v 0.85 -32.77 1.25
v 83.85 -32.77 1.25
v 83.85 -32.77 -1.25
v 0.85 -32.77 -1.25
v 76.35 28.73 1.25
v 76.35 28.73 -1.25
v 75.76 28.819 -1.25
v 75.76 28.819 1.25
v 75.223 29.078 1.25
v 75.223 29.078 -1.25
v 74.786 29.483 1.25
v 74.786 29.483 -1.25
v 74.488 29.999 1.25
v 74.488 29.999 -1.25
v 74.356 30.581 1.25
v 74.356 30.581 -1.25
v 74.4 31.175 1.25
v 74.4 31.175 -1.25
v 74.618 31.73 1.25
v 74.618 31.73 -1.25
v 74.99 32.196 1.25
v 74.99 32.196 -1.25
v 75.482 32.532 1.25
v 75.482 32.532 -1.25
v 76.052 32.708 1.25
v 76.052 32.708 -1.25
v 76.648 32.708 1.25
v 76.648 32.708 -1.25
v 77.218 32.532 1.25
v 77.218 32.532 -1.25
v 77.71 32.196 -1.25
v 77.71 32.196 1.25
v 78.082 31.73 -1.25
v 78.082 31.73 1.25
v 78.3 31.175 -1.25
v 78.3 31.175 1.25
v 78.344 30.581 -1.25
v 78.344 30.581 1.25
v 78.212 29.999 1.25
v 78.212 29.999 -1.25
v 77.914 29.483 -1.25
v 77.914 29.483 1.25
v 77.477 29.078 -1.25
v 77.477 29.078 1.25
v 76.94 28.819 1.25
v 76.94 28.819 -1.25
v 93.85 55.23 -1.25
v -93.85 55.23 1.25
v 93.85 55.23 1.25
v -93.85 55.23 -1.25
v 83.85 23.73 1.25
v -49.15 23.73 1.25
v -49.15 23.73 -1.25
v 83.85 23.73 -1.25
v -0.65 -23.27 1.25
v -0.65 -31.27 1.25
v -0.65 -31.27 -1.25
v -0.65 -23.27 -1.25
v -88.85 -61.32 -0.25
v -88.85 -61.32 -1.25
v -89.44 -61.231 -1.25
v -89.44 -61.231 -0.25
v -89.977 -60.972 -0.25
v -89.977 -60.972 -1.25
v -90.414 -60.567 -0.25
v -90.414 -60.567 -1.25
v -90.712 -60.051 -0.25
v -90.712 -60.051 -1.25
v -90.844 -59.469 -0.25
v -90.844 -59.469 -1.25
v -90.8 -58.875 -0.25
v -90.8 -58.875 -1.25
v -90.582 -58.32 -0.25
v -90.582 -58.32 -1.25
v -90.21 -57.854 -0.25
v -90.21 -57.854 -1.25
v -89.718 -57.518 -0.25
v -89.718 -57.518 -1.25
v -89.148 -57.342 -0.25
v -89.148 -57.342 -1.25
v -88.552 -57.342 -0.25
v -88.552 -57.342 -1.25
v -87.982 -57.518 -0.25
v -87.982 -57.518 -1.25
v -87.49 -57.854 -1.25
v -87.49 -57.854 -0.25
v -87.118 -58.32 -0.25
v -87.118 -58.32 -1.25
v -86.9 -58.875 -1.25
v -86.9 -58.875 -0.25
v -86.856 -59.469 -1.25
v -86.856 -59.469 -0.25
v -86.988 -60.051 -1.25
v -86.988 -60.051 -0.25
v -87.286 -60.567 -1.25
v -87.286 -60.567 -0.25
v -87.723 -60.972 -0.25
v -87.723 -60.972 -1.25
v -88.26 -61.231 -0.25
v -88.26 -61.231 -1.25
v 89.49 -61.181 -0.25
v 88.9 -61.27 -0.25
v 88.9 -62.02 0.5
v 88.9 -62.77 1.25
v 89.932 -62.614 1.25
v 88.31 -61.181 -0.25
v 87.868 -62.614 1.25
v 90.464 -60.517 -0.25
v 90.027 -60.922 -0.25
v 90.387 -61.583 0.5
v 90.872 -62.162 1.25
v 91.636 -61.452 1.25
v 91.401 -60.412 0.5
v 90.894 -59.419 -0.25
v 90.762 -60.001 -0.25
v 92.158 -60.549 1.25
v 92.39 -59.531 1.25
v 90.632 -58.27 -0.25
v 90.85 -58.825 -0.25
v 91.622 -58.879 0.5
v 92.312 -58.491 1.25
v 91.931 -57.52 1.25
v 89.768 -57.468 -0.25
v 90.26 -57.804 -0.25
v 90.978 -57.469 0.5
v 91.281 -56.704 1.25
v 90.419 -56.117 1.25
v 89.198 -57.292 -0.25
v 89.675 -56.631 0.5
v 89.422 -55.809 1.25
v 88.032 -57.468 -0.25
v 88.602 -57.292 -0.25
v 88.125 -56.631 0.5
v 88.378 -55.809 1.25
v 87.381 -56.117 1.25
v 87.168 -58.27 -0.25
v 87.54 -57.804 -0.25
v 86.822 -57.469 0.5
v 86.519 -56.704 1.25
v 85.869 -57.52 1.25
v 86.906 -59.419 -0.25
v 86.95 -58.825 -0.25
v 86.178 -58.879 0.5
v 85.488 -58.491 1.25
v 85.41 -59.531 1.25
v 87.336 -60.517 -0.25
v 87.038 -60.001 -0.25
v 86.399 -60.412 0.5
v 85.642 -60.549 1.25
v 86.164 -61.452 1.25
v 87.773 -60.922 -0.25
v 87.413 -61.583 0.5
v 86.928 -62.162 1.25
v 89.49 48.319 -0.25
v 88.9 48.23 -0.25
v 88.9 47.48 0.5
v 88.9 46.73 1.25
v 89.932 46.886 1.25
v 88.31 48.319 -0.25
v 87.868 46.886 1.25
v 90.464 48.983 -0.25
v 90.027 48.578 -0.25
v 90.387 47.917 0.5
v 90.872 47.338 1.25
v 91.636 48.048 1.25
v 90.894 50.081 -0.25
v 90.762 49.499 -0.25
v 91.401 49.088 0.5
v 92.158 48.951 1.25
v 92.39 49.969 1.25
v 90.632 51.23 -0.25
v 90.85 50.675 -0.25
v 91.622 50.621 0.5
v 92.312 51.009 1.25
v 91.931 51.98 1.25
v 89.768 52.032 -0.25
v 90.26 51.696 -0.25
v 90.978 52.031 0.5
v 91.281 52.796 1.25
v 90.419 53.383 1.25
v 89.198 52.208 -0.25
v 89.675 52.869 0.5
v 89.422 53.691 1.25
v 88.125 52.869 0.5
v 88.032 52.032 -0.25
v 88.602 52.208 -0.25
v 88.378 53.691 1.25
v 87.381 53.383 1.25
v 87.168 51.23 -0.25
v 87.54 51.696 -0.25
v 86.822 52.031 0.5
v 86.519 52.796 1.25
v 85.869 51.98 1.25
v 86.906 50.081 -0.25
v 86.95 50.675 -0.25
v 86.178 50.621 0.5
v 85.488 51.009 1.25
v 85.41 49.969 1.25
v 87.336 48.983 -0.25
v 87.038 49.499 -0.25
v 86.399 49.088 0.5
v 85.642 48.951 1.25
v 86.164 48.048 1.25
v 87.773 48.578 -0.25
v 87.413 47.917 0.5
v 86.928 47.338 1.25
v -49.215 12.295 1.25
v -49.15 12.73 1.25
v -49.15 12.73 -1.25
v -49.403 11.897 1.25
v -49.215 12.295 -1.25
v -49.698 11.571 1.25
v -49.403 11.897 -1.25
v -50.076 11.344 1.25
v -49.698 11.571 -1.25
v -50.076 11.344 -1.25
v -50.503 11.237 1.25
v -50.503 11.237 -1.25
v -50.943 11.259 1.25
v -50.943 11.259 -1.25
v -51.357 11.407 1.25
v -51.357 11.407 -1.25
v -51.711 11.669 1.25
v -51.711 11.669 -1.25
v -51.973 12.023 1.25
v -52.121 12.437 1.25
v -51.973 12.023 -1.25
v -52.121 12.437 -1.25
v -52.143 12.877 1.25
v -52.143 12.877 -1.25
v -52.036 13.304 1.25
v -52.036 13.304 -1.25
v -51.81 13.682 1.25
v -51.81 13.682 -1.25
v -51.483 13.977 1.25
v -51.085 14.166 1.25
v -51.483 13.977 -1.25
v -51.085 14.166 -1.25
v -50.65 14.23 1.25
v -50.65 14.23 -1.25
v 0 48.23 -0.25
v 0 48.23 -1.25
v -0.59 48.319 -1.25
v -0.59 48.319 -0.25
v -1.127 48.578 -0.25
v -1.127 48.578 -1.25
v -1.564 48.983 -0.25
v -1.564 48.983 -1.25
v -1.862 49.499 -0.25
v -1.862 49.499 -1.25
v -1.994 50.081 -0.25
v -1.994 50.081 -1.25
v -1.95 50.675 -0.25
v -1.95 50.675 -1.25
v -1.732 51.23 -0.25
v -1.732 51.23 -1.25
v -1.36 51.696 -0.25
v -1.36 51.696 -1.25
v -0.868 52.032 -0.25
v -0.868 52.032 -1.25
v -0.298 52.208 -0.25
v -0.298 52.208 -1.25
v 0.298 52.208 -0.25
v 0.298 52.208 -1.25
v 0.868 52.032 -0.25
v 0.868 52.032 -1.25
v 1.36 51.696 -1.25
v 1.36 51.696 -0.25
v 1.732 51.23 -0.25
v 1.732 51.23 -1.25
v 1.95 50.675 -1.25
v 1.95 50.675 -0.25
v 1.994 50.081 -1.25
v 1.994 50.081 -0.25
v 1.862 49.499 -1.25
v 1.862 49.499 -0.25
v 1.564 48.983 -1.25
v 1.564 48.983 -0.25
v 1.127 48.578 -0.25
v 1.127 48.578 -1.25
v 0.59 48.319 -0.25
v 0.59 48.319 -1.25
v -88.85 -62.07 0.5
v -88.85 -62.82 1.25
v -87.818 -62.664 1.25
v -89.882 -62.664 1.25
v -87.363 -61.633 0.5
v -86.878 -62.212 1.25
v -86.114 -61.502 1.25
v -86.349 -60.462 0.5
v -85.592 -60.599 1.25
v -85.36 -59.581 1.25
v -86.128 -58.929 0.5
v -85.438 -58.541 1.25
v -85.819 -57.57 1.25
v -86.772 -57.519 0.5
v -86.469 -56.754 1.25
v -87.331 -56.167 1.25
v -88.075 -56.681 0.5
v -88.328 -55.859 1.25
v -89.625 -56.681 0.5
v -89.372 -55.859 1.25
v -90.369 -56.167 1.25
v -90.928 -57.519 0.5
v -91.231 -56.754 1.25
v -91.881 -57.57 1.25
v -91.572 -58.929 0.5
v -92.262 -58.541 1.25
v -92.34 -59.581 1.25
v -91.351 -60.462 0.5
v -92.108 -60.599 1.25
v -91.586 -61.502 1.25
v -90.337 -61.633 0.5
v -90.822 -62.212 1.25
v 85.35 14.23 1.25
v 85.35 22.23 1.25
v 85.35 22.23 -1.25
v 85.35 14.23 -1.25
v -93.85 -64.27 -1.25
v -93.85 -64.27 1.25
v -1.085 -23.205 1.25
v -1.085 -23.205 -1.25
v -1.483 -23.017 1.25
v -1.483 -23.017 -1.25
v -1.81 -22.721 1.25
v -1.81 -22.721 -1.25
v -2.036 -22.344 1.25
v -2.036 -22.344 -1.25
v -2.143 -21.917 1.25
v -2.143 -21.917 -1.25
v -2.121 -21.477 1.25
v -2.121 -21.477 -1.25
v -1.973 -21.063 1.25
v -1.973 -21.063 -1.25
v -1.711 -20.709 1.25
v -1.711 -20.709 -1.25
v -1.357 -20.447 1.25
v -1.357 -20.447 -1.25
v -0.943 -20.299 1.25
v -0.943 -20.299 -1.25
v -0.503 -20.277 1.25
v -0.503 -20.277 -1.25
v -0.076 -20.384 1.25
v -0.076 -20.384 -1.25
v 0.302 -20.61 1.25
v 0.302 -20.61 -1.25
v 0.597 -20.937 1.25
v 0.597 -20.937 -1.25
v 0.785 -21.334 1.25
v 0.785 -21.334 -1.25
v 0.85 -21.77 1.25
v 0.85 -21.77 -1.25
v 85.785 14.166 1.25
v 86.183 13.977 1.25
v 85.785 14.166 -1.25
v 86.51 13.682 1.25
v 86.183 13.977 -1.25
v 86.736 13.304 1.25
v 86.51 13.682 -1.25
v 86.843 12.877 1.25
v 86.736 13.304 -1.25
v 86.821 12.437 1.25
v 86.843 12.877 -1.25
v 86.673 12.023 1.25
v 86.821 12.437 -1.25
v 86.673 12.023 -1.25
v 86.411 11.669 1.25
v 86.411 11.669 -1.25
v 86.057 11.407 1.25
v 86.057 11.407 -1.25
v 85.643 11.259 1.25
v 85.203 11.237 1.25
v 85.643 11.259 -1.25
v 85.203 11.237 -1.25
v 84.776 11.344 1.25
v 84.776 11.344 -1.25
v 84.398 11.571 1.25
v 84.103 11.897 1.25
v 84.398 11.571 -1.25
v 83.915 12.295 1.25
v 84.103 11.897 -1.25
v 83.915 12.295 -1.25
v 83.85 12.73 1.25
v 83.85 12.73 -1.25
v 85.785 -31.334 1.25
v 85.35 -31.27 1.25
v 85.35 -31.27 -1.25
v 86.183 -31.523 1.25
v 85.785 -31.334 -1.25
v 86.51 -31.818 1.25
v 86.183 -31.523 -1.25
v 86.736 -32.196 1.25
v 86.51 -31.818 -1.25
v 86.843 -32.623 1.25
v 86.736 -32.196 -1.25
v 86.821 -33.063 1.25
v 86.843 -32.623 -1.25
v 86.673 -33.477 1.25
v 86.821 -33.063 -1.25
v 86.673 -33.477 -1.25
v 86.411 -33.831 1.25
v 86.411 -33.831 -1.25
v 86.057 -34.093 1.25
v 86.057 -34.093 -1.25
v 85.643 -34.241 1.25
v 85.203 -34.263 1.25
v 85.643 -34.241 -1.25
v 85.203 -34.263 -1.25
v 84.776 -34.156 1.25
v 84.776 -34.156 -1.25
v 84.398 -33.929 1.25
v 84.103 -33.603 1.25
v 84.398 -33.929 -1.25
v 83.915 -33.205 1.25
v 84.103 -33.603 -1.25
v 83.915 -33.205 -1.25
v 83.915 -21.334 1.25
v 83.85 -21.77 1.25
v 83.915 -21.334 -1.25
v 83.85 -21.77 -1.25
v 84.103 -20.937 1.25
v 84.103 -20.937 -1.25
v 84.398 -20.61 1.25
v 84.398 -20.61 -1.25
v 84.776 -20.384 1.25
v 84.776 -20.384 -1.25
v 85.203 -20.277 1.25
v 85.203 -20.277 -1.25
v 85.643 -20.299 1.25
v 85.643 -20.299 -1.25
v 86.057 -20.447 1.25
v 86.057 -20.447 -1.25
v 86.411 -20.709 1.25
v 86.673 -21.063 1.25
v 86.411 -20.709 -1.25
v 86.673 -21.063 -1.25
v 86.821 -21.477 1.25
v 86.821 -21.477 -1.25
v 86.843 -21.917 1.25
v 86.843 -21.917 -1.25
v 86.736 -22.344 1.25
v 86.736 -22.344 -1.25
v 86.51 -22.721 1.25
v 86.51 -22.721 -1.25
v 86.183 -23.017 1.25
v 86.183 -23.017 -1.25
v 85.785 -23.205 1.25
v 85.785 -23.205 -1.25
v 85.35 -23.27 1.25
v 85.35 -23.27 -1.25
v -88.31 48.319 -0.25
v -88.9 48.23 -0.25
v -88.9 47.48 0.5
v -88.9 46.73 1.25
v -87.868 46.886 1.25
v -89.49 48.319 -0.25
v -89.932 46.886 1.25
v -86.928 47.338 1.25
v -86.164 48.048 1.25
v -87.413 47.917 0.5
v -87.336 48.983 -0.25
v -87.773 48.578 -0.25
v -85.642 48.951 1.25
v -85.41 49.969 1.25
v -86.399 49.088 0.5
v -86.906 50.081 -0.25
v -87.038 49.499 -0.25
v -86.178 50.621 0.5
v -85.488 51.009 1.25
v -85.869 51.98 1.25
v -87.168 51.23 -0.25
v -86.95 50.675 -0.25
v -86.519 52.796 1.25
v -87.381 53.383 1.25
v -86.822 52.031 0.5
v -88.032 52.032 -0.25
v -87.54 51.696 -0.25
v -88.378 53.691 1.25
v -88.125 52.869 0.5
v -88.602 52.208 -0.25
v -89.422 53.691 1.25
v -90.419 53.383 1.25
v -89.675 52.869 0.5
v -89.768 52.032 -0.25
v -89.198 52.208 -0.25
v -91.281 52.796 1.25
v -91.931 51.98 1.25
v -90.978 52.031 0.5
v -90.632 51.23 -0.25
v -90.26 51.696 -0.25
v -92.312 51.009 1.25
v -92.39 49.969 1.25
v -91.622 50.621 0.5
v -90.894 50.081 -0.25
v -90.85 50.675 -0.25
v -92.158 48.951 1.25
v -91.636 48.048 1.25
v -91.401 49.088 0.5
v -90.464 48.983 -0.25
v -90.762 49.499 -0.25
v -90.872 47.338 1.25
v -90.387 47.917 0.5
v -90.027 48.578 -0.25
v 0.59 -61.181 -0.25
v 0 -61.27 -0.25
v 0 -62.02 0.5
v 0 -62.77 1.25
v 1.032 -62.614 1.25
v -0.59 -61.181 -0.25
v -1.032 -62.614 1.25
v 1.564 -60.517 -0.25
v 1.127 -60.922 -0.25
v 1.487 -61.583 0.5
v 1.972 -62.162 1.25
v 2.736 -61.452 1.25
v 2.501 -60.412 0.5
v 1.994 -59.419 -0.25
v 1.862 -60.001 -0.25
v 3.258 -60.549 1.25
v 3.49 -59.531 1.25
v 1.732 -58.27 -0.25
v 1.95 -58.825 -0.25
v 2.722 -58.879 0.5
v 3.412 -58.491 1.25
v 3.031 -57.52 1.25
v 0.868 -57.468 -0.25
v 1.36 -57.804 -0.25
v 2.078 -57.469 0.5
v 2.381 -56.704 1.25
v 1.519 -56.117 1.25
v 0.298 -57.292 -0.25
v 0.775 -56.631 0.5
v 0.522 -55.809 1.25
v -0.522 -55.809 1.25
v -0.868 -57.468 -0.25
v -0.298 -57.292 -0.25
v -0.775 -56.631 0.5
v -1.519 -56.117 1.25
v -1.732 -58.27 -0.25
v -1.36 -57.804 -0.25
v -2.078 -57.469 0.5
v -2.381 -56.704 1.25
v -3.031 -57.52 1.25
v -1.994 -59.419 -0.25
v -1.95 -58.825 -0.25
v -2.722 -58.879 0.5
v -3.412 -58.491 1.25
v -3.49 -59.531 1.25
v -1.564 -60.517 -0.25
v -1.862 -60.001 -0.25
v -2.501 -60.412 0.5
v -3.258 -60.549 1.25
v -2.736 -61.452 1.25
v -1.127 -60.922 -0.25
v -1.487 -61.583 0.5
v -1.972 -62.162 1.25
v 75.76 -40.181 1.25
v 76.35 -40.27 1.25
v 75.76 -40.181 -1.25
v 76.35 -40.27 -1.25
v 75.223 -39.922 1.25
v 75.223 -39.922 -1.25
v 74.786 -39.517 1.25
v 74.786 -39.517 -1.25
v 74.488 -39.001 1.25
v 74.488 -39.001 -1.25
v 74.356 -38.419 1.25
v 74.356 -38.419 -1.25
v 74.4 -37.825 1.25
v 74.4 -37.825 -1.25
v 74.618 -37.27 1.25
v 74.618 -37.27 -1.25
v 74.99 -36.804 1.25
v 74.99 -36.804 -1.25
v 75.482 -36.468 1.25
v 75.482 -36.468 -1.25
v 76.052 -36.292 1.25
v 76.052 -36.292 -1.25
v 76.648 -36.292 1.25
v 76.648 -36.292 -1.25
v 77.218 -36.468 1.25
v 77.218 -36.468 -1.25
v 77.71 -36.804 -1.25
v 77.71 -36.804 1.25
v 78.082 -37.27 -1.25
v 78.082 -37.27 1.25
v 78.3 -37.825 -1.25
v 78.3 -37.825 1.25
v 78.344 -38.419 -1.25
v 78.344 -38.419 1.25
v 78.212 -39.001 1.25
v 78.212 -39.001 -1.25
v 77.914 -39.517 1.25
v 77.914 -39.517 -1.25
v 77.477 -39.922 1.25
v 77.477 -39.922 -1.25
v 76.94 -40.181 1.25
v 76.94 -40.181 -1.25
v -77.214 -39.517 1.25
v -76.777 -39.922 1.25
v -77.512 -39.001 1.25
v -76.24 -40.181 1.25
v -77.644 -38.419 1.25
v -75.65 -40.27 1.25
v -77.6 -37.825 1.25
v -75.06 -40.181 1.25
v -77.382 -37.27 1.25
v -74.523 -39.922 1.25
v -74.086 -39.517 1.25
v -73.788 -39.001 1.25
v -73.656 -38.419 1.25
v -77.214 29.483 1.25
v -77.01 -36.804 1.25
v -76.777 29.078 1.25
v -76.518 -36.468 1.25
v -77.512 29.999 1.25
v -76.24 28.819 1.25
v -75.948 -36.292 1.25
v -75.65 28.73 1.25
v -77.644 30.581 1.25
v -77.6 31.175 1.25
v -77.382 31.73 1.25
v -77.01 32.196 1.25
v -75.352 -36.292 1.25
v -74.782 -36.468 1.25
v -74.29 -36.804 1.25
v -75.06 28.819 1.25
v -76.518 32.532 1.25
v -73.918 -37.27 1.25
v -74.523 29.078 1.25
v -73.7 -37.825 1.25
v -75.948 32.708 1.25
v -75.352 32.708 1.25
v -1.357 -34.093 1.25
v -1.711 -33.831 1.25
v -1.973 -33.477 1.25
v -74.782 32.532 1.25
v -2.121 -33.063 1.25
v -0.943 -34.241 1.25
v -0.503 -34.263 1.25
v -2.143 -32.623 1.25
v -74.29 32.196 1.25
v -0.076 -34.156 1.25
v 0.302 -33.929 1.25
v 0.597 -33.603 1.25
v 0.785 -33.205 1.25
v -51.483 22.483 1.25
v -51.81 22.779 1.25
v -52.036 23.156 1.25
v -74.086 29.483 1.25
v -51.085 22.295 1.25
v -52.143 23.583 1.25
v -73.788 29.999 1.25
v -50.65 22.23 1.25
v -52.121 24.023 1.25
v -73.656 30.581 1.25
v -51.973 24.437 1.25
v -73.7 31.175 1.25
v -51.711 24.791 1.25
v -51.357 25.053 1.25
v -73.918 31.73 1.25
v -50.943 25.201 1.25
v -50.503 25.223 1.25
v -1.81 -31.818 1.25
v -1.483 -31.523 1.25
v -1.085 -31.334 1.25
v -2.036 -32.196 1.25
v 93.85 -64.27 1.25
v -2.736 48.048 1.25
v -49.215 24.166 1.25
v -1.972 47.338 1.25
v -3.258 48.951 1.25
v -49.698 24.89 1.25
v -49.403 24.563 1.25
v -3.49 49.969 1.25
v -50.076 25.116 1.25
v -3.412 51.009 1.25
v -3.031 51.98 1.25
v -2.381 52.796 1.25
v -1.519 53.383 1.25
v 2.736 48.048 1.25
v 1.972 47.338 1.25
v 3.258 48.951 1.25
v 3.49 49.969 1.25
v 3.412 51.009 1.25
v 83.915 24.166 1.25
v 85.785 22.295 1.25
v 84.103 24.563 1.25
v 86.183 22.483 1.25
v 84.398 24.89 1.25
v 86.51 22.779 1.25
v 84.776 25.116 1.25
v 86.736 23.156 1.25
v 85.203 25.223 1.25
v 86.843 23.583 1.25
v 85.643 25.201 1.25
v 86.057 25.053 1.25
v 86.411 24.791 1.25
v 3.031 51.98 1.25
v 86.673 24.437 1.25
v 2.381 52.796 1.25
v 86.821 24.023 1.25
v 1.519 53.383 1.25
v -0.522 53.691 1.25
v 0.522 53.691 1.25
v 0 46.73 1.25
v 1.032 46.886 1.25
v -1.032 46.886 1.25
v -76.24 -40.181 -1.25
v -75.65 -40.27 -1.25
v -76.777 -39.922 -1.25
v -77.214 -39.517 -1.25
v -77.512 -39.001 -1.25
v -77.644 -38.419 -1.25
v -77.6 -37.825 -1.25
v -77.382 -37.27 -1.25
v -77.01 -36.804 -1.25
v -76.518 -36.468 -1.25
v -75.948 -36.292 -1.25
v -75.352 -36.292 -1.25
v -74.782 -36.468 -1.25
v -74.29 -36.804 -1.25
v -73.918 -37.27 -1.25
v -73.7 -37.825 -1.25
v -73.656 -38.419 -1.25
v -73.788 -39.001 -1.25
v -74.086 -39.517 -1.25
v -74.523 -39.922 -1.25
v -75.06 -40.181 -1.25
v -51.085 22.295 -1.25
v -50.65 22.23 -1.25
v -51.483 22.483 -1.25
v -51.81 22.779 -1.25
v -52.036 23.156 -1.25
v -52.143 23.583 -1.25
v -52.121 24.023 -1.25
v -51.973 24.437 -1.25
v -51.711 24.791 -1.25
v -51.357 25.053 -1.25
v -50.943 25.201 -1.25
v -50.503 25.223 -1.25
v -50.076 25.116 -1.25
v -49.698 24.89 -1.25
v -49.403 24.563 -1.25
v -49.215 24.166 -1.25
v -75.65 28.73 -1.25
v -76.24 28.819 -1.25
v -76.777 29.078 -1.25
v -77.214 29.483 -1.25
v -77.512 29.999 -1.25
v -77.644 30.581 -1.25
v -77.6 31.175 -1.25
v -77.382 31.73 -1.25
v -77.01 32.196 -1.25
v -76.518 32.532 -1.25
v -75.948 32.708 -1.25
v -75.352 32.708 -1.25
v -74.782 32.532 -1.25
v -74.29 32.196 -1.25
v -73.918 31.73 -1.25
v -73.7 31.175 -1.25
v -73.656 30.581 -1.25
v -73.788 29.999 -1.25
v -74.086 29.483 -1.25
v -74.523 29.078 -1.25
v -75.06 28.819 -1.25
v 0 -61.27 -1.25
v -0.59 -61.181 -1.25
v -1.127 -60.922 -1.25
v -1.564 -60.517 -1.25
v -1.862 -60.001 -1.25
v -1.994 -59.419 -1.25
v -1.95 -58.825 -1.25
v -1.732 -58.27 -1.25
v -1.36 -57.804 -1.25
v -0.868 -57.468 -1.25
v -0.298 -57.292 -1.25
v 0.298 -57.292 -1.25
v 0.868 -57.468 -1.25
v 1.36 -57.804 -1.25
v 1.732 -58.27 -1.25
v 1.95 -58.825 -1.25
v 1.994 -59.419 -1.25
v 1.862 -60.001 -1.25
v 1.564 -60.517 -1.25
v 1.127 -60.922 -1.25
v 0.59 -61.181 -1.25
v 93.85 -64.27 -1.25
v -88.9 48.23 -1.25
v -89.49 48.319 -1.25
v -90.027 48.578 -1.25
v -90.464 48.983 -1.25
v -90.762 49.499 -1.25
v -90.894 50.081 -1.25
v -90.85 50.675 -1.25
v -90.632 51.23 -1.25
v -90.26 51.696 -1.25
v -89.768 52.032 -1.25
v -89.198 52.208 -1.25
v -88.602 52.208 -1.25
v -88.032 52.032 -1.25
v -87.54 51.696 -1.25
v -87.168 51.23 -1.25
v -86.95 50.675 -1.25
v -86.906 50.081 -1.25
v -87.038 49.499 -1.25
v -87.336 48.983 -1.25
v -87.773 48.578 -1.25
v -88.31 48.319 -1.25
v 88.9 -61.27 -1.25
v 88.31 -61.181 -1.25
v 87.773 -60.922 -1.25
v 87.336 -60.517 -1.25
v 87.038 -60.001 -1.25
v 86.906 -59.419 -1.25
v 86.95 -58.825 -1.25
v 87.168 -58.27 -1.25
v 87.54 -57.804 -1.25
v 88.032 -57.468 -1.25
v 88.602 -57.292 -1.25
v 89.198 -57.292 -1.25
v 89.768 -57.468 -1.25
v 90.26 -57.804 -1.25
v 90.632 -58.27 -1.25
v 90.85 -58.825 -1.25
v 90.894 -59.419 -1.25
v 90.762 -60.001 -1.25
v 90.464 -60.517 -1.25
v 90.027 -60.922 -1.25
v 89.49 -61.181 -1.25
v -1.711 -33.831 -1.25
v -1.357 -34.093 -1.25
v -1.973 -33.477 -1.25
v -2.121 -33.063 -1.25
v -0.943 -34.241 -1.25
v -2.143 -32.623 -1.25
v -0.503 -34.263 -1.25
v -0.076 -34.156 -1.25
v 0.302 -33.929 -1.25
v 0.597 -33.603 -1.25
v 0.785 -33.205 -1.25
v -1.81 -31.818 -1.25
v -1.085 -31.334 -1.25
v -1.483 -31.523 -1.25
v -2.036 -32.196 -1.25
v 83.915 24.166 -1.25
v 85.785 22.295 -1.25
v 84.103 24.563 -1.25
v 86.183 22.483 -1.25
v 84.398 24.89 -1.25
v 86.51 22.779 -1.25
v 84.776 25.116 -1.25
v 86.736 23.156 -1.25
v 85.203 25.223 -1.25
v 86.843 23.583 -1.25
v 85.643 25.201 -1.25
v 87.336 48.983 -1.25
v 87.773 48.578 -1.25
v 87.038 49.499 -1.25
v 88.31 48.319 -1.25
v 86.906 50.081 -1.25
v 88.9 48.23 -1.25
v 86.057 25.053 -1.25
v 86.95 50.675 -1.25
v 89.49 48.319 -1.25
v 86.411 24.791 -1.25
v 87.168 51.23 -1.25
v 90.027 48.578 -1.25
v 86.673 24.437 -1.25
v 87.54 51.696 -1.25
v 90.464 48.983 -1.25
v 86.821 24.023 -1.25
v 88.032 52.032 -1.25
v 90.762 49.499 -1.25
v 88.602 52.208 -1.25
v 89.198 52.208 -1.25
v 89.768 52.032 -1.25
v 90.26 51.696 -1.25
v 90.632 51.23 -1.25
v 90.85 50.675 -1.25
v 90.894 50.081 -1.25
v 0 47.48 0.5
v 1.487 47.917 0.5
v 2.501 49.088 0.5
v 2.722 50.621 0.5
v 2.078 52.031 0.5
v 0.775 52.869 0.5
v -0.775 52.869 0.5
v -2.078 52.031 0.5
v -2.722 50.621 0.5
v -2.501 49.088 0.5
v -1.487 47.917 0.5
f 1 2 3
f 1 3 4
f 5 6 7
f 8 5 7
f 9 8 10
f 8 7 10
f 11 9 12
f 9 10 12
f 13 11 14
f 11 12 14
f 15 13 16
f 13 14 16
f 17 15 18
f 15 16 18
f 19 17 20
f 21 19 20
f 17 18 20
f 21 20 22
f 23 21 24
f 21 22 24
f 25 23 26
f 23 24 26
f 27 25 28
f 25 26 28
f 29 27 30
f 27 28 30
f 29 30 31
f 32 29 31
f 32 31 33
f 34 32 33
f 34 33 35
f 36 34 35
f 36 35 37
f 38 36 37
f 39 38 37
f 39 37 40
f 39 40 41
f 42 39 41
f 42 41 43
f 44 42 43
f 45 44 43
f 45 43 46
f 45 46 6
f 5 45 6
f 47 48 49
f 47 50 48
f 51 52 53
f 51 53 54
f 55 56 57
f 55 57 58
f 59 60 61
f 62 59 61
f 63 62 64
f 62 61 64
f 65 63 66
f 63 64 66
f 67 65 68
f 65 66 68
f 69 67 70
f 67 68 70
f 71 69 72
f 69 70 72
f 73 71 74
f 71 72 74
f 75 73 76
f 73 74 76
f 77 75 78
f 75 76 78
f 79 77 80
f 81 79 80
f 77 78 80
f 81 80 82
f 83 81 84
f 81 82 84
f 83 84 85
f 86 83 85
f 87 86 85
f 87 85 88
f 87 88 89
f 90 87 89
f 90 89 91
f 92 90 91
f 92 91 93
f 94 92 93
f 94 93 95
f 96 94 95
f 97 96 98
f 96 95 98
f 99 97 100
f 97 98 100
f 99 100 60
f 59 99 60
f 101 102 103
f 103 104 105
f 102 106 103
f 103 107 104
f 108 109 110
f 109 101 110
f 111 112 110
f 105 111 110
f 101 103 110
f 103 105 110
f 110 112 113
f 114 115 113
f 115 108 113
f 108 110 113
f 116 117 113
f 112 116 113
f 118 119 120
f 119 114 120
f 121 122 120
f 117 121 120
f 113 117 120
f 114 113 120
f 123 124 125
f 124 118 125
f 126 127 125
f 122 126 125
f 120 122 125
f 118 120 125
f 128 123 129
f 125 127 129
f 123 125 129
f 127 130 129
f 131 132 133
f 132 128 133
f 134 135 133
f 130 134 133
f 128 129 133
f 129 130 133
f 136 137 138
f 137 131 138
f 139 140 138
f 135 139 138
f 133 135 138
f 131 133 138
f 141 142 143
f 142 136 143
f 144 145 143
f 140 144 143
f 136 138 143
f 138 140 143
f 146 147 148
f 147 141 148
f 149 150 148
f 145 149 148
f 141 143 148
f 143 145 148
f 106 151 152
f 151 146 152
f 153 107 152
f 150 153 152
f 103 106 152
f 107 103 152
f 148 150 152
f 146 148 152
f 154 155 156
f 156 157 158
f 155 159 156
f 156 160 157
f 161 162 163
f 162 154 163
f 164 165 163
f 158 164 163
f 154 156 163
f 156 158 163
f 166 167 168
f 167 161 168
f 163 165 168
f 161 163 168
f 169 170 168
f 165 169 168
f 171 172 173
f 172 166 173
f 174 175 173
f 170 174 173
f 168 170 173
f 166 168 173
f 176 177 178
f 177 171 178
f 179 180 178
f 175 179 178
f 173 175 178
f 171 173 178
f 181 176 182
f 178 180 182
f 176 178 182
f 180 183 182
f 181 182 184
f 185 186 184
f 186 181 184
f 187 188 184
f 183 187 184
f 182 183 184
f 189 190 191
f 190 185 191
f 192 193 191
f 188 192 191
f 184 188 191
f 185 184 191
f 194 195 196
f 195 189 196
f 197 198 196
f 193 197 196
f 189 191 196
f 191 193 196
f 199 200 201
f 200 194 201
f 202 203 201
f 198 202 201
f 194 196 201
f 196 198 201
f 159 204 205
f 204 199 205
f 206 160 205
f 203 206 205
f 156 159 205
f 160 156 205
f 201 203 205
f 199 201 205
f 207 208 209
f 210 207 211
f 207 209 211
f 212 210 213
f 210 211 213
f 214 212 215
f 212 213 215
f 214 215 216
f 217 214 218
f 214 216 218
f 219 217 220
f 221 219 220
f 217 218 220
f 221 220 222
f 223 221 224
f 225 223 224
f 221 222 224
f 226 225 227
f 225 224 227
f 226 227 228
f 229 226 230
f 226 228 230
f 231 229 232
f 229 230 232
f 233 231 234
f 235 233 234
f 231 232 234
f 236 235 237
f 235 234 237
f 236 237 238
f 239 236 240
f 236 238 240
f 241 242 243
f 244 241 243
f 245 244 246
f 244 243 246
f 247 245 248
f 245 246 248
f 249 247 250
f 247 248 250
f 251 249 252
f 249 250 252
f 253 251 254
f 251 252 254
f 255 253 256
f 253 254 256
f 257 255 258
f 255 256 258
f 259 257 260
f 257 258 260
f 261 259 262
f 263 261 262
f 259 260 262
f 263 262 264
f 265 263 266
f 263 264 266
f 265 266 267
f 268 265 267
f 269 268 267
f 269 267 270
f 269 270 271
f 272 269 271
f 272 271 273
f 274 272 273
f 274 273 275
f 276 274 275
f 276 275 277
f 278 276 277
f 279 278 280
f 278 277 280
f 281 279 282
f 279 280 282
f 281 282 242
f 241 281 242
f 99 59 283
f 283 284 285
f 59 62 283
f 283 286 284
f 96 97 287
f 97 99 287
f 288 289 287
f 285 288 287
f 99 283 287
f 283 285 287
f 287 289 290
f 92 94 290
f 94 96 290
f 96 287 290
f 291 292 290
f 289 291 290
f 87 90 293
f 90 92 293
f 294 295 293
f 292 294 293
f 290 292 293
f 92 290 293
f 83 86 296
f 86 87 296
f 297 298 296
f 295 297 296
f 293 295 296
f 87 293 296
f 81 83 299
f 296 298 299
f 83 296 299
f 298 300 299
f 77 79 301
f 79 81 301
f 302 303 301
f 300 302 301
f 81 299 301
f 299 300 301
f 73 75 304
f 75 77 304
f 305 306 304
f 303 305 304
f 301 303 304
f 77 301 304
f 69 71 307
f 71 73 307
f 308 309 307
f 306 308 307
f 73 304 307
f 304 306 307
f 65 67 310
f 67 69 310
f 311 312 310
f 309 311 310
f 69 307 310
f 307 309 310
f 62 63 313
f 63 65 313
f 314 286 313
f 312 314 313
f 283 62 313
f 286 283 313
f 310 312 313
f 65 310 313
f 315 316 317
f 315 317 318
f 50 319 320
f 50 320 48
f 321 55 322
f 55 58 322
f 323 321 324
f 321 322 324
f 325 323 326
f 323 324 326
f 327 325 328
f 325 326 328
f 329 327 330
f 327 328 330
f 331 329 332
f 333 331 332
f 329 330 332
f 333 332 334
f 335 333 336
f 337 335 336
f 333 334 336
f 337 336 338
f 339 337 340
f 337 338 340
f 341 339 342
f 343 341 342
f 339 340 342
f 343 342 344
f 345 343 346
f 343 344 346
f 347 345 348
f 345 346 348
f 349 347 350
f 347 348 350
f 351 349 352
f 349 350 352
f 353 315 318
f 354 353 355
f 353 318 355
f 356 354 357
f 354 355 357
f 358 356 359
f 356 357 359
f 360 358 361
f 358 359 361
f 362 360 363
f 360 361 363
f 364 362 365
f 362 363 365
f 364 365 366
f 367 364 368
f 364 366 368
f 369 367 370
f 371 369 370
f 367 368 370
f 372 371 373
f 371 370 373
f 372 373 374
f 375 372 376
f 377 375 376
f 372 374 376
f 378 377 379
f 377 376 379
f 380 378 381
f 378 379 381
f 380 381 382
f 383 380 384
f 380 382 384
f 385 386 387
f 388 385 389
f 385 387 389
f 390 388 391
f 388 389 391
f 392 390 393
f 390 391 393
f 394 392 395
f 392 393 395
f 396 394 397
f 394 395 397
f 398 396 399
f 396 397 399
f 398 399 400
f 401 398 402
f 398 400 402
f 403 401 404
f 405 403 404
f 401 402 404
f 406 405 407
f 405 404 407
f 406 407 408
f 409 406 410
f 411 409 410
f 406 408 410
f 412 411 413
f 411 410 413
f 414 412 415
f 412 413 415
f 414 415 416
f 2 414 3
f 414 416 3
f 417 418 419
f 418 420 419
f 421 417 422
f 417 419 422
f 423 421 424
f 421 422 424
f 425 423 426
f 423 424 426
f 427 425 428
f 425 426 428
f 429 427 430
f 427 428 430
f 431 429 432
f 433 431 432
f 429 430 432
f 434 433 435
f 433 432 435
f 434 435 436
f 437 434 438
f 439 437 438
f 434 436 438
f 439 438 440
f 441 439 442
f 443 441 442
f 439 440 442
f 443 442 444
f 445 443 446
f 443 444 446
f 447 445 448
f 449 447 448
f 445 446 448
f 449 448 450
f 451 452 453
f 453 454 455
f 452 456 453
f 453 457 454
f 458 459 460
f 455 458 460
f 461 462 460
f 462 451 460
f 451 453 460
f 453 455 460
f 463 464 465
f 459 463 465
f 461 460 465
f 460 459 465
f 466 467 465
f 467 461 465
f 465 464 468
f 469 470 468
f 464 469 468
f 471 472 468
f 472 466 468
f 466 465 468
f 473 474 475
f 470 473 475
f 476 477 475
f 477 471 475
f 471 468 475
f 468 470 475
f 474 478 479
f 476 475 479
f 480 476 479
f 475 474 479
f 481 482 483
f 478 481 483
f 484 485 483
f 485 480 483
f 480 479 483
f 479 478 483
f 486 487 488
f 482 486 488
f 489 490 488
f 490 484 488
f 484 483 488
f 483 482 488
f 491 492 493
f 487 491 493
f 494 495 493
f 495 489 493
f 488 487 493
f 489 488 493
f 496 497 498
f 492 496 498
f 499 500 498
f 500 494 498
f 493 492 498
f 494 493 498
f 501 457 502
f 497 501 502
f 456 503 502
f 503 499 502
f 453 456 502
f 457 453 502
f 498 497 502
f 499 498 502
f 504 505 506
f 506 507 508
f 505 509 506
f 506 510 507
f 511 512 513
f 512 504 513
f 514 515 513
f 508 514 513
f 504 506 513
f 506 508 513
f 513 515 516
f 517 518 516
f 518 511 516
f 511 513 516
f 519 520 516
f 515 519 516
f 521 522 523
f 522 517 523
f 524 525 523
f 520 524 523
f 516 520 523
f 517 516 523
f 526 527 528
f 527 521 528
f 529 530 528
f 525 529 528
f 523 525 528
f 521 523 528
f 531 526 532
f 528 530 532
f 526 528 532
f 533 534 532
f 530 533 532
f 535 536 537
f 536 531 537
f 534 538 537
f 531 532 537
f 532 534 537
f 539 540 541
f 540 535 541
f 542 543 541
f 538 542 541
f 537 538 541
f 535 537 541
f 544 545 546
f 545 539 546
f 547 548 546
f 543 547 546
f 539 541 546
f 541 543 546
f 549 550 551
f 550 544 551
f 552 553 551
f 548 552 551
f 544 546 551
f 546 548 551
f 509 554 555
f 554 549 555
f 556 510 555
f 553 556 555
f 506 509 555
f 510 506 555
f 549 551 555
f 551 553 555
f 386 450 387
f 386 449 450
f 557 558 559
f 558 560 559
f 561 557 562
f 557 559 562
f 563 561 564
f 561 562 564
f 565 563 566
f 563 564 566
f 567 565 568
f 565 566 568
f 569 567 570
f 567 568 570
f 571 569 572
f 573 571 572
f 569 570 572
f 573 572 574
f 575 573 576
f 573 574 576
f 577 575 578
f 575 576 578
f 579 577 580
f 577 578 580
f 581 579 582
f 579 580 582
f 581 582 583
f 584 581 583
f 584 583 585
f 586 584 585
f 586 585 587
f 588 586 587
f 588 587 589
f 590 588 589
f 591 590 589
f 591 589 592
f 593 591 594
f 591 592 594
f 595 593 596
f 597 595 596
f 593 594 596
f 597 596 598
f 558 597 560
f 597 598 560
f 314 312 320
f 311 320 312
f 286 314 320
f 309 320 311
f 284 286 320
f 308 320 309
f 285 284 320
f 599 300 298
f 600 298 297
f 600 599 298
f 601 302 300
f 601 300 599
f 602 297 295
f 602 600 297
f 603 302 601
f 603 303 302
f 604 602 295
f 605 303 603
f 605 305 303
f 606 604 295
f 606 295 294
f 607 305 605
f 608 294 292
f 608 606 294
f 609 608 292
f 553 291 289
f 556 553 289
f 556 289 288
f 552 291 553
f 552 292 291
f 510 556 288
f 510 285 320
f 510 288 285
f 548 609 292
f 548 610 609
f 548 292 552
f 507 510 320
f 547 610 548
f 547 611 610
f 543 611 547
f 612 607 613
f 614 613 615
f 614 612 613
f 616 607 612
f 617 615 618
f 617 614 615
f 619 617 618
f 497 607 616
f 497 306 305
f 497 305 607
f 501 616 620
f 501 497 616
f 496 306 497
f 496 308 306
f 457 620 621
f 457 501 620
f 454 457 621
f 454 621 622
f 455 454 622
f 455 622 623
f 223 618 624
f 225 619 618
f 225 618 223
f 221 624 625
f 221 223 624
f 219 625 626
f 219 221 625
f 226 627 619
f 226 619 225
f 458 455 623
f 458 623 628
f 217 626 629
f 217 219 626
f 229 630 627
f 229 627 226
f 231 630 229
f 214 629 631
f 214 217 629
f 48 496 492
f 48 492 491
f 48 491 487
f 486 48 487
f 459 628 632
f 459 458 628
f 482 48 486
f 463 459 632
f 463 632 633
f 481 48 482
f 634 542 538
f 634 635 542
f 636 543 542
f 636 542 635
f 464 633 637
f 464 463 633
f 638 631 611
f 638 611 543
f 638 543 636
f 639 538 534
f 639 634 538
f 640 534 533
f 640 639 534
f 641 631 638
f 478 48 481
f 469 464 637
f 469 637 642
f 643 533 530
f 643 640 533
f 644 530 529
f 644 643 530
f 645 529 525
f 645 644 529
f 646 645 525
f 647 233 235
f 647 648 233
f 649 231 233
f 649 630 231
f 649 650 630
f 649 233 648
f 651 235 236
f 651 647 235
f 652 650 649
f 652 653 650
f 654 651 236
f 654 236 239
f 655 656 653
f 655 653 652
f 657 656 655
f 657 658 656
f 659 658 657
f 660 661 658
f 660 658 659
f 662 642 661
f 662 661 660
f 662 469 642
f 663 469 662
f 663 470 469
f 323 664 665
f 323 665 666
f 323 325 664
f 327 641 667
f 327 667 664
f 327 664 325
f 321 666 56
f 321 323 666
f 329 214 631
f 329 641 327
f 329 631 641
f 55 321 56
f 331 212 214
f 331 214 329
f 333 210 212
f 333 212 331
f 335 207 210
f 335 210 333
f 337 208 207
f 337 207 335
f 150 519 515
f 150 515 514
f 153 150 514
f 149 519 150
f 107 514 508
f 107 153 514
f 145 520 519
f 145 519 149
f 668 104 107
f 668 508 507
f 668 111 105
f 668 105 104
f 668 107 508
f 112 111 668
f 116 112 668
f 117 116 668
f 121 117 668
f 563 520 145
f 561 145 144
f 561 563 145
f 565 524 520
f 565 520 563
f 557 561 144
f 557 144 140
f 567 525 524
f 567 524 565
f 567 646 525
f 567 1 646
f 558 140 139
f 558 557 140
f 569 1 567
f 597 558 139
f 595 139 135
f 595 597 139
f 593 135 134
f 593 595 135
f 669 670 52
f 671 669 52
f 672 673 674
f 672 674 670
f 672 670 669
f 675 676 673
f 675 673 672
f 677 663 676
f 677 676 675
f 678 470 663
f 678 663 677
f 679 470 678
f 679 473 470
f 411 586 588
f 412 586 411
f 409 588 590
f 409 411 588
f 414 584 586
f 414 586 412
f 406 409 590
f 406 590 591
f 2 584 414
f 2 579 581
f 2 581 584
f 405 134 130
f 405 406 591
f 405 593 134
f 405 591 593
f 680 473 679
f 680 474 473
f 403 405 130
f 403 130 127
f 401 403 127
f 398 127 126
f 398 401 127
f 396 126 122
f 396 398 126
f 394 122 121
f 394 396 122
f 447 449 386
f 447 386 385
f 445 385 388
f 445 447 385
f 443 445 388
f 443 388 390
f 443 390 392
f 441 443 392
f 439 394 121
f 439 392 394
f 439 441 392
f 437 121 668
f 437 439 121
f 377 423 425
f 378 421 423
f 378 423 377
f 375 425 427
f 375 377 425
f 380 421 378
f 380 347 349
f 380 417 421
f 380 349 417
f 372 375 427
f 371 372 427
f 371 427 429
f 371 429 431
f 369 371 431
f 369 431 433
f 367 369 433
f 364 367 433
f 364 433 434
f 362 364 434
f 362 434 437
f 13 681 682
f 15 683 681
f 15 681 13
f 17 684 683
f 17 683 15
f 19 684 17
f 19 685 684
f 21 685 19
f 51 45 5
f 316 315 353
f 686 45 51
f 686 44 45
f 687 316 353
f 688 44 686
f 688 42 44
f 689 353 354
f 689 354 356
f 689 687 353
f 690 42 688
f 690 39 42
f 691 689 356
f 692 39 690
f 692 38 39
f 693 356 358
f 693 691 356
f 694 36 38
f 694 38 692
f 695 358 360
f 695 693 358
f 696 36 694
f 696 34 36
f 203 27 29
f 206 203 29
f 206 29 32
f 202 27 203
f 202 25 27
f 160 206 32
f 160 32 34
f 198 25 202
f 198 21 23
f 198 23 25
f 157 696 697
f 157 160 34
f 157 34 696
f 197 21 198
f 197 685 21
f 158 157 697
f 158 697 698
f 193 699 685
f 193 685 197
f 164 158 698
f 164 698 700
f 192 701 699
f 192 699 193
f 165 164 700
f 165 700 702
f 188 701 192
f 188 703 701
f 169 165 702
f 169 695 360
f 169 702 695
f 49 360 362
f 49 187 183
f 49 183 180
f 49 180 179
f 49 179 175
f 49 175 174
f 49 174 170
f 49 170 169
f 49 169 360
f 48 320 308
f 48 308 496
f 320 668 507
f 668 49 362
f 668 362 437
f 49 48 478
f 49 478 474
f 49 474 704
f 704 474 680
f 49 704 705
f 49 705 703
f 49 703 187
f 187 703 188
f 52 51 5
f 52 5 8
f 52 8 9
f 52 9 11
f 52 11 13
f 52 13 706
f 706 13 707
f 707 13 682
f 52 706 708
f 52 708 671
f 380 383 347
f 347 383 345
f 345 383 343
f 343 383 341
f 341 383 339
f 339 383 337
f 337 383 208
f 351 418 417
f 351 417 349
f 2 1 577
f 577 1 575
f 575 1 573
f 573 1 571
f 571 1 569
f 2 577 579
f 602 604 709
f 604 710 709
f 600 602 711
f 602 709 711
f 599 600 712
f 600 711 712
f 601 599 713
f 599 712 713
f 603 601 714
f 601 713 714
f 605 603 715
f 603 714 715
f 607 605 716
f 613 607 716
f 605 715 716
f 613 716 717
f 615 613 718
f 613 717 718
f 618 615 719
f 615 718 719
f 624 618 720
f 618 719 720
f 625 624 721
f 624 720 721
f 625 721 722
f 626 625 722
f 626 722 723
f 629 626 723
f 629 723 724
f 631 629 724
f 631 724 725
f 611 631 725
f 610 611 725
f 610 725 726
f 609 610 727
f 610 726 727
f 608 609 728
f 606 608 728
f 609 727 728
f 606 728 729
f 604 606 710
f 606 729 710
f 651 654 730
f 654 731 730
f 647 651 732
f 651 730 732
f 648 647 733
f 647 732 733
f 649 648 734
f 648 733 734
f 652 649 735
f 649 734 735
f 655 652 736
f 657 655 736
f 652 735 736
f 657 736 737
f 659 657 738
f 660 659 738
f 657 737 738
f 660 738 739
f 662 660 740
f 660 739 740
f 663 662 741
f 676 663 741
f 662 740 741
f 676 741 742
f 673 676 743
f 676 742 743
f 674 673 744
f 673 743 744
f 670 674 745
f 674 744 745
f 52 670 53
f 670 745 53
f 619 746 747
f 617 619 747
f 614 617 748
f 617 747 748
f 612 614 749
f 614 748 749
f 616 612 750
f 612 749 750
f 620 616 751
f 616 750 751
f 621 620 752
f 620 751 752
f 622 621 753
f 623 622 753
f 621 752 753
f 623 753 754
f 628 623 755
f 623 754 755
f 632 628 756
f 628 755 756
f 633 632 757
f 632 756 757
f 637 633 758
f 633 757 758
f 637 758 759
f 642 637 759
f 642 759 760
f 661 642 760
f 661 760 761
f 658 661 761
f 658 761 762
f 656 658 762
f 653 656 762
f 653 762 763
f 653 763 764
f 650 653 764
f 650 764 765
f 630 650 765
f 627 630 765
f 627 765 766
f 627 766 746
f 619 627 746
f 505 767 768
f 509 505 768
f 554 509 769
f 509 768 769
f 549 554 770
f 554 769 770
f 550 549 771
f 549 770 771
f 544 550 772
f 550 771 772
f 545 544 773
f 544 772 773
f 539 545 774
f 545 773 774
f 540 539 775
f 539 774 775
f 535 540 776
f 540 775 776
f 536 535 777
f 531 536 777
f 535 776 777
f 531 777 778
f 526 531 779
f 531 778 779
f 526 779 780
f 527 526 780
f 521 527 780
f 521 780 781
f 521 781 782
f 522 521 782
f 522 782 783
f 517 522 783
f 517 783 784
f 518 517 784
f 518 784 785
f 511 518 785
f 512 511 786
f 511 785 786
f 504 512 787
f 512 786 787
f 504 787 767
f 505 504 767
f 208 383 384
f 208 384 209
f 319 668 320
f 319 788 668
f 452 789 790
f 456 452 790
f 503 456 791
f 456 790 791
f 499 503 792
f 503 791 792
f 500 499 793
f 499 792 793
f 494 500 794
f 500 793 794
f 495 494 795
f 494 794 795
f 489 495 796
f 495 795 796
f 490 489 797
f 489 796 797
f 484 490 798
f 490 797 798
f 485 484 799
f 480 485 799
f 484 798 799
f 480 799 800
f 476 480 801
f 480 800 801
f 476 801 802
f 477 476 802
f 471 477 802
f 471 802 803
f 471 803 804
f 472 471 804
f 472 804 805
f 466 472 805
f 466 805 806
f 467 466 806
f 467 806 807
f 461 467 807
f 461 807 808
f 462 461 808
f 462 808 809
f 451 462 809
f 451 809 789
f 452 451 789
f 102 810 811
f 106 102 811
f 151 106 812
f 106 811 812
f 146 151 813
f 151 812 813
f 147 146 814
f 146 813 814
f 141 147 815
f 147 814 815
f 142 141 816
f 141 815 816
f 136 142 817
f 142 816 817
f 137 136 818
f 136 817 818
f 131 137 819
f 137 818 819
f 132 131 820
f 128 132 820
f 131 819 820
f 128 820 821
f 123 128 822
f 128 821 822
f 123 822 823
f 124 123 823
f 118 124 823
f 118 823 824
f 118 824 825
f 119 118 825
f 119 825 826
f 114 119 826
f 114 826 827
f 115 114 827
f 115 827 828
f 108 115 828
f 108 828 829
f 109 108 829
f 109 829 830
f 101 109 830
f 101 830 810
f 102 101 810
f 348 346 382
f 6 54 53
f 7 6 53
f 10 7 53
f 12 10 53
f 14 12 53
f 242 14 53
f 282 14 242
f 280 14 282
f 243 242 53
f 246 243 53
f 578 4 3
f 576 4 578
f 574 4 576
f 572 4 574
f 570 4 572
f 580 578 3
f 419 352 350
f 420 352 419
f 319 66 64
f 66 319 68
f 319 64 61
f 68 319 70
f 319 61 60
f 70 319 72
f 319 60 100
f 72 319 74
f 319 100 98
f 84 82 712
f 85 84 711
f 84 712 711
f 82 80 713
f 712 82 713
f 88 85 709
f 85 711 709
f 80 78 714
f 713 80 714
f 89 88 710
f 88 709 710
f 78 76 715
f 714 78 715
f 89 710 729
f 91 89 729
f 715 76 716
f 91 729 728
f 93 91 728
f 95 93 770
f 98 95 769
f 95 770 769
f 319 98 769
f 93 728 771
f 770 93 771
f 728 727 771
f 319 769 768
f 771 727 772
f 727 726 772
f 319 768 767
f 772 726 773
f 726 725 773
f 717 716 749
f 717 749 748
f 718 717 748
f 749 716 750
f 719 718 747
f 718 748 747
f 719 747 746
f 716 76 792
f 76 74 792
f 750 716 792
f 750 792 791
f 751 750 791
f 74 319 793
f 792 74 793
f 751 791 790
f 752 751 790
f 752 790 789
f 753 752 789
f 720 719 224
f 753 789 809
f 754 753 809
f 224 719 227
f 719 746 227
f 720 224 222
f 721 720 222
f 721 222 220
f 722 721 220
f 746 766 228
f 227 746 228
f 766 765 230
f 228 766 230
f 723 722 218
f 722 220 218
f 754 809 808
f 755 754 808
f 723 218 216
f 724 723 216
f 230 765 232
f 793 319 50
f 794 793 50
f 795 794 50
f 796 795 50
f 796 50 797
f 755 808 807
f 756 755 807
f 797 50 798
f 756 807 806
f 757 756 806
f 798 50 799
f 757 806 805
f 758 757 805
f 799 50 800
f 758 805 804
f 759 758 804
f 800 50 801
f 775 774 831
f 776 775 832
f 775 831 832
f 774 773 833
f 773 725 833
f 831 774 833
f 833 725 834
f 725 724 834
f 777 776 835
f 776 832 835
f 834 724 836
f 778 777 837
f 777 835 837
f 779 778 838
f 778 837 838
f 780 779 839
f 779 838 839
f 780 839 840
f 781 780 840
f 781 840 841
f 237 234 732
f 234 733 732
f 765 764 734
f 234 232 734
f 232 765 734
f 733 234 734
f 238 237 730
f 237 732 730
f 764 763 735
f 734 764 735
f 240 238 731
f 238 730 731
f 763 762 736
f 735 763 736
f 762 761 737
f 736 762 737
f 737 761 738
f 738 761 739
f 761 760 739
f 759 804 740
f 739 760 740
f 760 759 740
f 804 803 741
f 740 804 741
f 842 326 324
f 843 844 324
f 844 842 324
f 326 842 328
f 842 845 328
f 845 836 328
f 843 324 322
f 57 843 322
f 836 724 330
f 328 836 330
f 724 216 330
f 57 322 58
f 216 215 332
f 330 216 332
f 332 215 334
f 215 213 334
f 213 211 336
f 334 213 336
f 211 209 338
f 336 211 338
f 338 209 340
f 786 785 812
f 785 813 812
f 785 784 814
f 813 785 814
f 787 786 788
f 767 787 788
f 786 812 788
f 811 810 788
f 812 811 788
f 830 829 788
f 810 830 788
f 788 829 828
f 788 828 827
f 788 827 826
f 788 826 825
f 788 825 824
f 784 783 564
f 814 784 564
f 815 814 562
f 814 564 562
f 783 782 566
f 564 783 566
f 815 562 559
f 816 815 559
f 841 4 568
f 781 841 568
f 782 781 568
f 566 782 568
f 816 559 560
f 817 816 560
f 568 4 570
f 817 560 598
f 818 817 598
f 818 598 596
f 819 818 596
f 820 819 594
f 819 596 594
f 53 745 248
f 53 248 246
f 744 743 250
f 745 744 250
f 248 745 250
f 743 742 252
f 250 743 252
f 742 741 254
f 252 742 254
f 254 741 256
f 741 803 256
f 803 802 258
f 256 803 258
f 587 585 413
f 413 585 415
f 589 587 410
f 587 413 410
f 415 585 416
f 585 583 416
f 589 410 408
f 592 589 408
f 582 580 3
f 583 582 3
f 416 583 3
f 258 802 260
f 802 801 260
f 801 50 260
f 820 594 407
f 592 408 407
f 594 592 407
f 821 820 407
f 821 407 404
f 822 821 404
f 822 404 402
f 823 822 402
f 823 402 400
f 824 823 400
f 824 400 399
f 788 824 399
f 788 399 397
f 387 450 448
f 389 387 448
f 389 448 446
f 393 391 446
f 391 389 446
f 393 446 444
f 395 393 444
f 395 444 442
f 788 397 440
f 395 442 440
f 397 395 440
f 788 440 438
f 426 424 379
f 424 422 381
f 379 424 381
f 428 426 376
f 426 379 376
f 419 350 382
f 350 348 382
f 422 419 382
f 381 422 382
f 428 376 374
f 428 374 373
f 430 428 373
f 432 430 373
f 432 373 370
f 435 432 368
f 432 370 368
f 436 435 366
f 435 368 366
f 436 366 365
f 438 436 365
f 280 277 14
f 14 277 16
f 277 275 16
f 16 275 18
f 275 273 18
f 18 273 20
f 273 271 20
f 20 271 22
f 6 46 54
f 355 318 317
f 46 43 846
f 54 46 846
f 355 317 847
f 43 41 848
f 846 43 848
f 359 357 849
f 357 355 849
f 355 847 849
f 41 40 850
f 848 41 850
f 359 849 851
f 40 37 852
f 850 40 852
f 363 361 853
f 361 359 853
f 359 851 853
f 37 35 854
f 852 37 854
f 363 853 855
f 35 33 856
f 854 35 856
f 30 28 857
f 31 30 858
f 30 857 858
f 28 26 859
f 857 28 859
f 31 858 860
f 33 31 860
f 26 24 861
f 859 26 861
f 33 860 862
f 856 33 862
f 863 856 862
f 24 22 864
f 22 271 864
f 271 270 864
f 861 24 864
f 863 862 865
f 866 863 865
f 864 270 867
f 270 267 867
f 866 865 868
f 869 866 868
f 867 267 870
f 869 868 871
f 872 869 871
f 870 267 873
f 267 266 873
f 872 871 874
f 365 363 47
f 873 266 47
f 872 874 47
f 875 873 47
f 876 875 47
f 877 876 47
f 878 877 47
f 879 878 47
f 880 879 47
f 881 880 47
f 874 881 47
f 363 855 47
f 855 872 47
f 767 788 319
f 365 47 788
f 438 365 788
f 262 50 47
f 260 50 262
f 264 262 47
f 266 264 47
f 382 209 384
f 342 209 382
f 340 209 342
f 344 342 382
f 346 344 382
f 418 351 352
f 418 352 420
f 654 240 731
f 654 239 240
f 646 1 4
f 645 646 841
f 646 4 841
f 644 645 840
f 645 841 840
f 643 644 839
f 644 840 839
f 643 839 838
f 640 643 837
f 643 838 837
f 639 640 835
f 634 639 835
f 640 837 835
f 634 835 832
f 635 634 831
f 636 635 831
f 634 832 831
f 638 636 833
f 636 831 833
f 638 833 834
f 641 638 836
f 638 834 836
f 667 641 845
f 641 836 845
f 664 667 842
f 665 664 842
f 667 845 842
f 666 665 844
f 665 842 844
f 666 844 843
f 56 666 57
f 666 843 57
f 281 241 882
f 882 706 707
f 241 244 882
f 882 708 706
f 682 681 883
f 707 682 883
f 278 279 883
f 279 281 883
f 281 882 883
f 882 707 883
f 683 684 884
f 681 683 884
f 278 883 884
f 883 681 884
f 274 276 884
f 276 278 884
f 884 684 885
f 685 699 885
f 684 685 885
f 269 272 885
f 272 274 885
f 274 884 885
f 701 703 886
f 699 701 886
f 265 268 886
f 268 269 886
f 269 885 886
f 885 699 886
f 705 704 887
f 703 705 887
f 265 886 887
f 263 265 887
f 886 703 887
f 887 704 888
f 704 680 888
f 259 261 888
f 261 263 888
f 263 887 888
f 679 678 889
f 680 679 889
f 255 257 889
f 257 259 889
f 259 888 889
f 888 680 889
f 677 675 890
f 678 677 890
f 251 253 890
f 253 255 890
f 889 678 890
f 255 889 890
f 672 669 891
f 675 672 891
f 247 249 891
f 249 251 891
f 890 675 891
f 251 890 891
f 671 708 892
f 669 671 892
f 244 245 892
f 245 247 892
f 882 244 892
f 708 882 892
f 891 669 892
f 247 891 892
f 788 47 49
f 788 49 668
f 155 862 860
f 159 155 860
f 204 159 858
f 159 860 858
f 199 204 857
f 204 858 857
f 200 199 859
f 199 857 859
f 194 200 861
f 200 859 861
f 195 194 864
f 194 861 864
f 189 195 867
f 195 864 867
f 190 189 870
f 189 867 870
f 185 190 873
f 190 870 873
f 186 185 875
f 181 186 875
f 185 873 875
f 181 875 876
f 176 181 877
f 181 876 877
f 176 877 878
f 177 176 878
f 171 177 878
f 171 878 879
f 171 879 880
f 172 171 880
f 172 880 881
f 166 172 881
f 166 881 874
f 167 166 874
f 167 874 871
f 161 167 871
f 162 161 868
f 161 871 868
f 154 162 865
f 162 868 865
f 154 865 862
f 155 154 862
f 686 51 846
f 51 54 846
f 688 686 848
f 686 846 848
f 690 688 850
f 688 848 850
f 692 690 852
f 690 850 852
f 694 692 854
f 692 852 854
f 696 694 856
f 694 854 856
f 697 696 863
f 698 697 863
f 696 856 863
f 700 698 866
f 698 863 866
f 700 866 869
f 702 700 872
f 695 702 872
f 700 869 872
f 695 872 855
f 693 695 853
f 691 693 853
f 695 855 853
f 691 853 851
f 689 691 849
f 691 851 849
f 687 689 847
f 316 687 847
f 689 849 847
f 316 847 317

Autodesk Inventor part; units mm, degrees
ref_plane "YZ Plane" through (0, 0, 0) normal (1, 0, 0) x (0, 1, 0)
ref_plane "XZ Plane" through (0, 0, 0) normal (0, 1, 0) x (-1, 0, 0)
ref_plane "XY Plane" through (0, 0, 0) normal (0, 0, 1) x (1, 0, 0)
sketch "Sketch1" plane through (0, 0, 0) normal (0, 0, 1) x (1, 0, 0)
  line L0 (93.85, -64.2699) -> (-93.85, -64.2699)
  line L1 (-93.85, -64.2699) -> (-93.85, 55.2301)
  line L2 (-93.85, 55.2301) -> (93.85, 55.2301)
  line L3 (93.85, 55.2301) -> (93.85, -64.2699)
  line L4 (93.85, -64.2699) -> (-93.85, 55.2301) construction
  line L5 (-93.85, -64.2699) -> (93.85, 55.2301) construction
  point P0 (0, 0)
  point P1 (0, -4.5199)
  dimension "d0" = 187.7
  dimension "d1" = 119.5
extrude "Extrusion1" add sketch "Sketch1" along normal mid plane 2.5
hole "Hole2" at (-88.85, -59.3199, 1.25) direction (0, 0, -1) diameter 4 end through all countersink diameter 7 countersink angle 90
hole "Hole3" at (0, -59.2699, 1.25) direction (0, 0, -1) diameter 4 end through all countersink diameter 7 countersink angle 90
hole "Hole4" at (88.9, -59.2699, 1.25) direction (0, 0, -1) diameter 4 end through all countersink diameter 7 countersink angle 90
hole "Hole5" at (-88.9, 50.2301, 1.25) direction (0, 0, -1) diameter 4 end through all countersink diameter 7 countersink angle 90
hole "Hole6" at (0, 50.2301, 1.25) direction (0, 0, -1) diameter 4 end through all countersink diameter 7 countersink angle 90
hole "Hole7" at (88.9, 50.2301, 1.25) direction (0, 0, -1) diameter 4 end through all countersink diameter 7 countersink angle 90
hole "Hole8" at (76.35, -38.2699, 1.25) direction (0, 0, -1) diameter 4 end through all
hole "Hole9" at (76.35, 30.7301, 1.25) direction (0, 0, -1) diameter 4 end through all
hole "Hole10" at (-75.65, -38.2699, 1.25) direction (0, 0, -1) diameter 4 end through all
hole "Hole11" at (-75.65, 30.7301, 1.25) direction (0, 0, -1) diameter 4 end through all
sketch "Sketch5" plane through (0, 0, 1.25) normal (0, 0, 1) x (1, 0, 0)
  circle A0 centre (76.35, -38.2699) radius 2 projected
  line L0 (93.85, -64.2699) -> (93.85, 55.2301) projected
  line L1 (-0.65, -21.7699) -> (85.35, -21.7699)
  line L2 (85.35, -21.7699) -> (85.35, -32.7699)
  line L3 (85.35, -32.7699) -> (-0.65, -32.7699)
  line L4 (-0.65, -32.7699) -> (-0.65, -21.7699)
  point P0 (0, 0)
  dimension "d120" = 8.5
  dimension "d121" = 5.5
  dimension "d122" = 11
  dimension "d123" = 86
extrude "Cut1" cut sketch "Sketch5" along normal through all both and the other way through all contours L1 L2 L3 L4
pattern_linear "Rectangular Pattern1" count 2 spacing 45.5 along (0, 1, 0) of "Cut1"
hole "Hole19" at (85.35, 12.7301, 1.25) direction (0, 0, -1) diameter 3 end through all
hole "Hole20" at (85.35, 23.7301, 1.25) direction (0, 0, -1) diameter 3 end through all
hole "Hole23" at (85.35, -21.7699, 1.25) direction (0, 0, -1) diameter 3 end through all
hole "Hole24" at (85.35, -32.7699, 1.25) direction (0, 0, -1) diameter 3 end through all
sketch "Sketch8" plane through (0, 0, 1.25) normal (0, 0, 1) x (1, 0, 0)
  arc A0 (-0.65, 14.2301) -> (0.85, 12.7301) centre (-0.65, 12.7301) ccw projected
  line L0 (-0.65, 12.7301) -> (-0.65, 23.7301) projected
  arc A1 (0.85, 23.7301) -> (-0.65, 22.2301) centre (-0.65, 23.7301) ccw projected
  line L1 (-0.65, 23.7301) -> (-0.65, 12.7301)
  line L2 (-0.65, 12.7301) -> (-50.65, 12.7301)
  line L3 (-50.65, 12.7301) -> (-50.65, 23.7301)
  line L4 (-50.65, 23.7301) -> (-0.65, 23.7301)
  arc A2 (83.85, -32.7699) -> (85.35, -31.2699) centre (85.35, -32.7699) ccw projected
  line L5 (83.85, -32.7699) -> (-0.65, -32.7699) projected
  line L6 (-0.65, -32.7699) -> (-0.65, -21.7699) projected
  line L7 (-0.65, -21.7699) -> (83.85, -21.7699) projected
  arc A3 (85.35, -23.2699) -> (83.85, -21.7699) centre (85.35, -21.7699) ccw projected
  line L8 (85.35, -23.2699) -> (85.35, -31.2699) projected
  arc A4 (85.35, 22.2301) -> (83.85, 23.7301) centre (85.35, 23.7301) ccw projected
  line L9 (85.35, 22.2301) -> (85.35, 14.2301) projected
  arc A5 (83.85, 12.7301) -> (85.35, 14.2301) centre (85.35, 12.7301) ccw projected
  line L10 (83.85, 12.7301) -> (-0.65, 12.7301) projected
  line L11 (-0.65, 12.7301) -> (-0.65, 23.7301) projected
  line L12 (-0.65, 23.7301) -> (83.85, 23.7301) projected
  circle A6 centre (-75.65, 30.7301) radius 2 projected
  circle A7 centre (-75.65, -38.2699) radius 2 projected
  circle A8 centre (76.35, 30.7301) radius 2 projected
  circle A9 centre (76.35, -38.2699) radius 2 projected
  circle A10 centre (88.9, 50.2301) radius 3.5 projected
  circle A11 centre (0, 50.2301) radius 3.5 projected
  circle A12 centre (-88.9, 50.2301) radius 3.5 projected
  circle A13 centre (88.9, -59.2699) radius 3.5 projected
  circle A14 centre (0, -59.2699) radius 3.5 projected
  circle A15 centre (-88.85, -59.3199) radius 3.5 projected
  line L13 (-93.85, -64.2699) -> (93.85, -64.2699) projected
  line L14 (93.85, -64.2699) -> (93.85, 55.2301) projected
  line L15 (93.85, 55.2301) -> (-93.85, 55.2301) projected
  line L16 (-93.85, 55.2301) -> (-93.85, -64.2699) projected
  point P0 (0, 0)
  dimension "d273" = 50
extrude "Cut4" cut sketch "Sketch8" against normal through all contours L0 L2 A0 | A0 L2 L3 L4 A1 L0 | A1 L4 L0
hole "Hole27" at (-50.65, 23.7301, 1.25) direction (0, 0, -1) diameter 3 end through all
hole "Hole28" at (-50.65, 12.7301, 1.25) direction (0, 0, -1) diameter 3 end through all
hole "Hole29" at (-0.65, -21.7699, 1.25) direction (0, 0, -1) diameter 3 end through all
hole "Hole30" at (-0.65, -32.7699, 1.25) direction (0, 0, -1) diameter 3 end through all
equation "\"d124\" = Thickness"
equation "\"d205\" = Thickness"
equation "\"d214\" = Thickness"
equation "\"d241\" = Thickness"
equation "\"d250\" = Thickness"
equation "\"d274\" = Thickness"
equation "\"d283\" = Thickness"
equation "\"d292\" = Thickness"
equation "\"d301\" = Thickness"
equation "\"d310\" = Thickness"
equation "\"BendRadius\" = Thickness"
equation "\"BendReliefWidth\" = Thickness"
equation "\"BendReliefDepth\" = 0.5 * Thickness"
equation "\"CornerReliefSize\" = 4 * Thickness"
equation "\"MinimumRemnant\" = 2 * Thickness"
equation "\"TransitionRadius\" = BendRadius"
equation "\"JacobiRadiusSize\" = Thickness"
equation "\"GapSize\" = Thickness"
equation "\"Thickness\" = 0.5"
properties part number "Driver4BusV11TopCorrected"
